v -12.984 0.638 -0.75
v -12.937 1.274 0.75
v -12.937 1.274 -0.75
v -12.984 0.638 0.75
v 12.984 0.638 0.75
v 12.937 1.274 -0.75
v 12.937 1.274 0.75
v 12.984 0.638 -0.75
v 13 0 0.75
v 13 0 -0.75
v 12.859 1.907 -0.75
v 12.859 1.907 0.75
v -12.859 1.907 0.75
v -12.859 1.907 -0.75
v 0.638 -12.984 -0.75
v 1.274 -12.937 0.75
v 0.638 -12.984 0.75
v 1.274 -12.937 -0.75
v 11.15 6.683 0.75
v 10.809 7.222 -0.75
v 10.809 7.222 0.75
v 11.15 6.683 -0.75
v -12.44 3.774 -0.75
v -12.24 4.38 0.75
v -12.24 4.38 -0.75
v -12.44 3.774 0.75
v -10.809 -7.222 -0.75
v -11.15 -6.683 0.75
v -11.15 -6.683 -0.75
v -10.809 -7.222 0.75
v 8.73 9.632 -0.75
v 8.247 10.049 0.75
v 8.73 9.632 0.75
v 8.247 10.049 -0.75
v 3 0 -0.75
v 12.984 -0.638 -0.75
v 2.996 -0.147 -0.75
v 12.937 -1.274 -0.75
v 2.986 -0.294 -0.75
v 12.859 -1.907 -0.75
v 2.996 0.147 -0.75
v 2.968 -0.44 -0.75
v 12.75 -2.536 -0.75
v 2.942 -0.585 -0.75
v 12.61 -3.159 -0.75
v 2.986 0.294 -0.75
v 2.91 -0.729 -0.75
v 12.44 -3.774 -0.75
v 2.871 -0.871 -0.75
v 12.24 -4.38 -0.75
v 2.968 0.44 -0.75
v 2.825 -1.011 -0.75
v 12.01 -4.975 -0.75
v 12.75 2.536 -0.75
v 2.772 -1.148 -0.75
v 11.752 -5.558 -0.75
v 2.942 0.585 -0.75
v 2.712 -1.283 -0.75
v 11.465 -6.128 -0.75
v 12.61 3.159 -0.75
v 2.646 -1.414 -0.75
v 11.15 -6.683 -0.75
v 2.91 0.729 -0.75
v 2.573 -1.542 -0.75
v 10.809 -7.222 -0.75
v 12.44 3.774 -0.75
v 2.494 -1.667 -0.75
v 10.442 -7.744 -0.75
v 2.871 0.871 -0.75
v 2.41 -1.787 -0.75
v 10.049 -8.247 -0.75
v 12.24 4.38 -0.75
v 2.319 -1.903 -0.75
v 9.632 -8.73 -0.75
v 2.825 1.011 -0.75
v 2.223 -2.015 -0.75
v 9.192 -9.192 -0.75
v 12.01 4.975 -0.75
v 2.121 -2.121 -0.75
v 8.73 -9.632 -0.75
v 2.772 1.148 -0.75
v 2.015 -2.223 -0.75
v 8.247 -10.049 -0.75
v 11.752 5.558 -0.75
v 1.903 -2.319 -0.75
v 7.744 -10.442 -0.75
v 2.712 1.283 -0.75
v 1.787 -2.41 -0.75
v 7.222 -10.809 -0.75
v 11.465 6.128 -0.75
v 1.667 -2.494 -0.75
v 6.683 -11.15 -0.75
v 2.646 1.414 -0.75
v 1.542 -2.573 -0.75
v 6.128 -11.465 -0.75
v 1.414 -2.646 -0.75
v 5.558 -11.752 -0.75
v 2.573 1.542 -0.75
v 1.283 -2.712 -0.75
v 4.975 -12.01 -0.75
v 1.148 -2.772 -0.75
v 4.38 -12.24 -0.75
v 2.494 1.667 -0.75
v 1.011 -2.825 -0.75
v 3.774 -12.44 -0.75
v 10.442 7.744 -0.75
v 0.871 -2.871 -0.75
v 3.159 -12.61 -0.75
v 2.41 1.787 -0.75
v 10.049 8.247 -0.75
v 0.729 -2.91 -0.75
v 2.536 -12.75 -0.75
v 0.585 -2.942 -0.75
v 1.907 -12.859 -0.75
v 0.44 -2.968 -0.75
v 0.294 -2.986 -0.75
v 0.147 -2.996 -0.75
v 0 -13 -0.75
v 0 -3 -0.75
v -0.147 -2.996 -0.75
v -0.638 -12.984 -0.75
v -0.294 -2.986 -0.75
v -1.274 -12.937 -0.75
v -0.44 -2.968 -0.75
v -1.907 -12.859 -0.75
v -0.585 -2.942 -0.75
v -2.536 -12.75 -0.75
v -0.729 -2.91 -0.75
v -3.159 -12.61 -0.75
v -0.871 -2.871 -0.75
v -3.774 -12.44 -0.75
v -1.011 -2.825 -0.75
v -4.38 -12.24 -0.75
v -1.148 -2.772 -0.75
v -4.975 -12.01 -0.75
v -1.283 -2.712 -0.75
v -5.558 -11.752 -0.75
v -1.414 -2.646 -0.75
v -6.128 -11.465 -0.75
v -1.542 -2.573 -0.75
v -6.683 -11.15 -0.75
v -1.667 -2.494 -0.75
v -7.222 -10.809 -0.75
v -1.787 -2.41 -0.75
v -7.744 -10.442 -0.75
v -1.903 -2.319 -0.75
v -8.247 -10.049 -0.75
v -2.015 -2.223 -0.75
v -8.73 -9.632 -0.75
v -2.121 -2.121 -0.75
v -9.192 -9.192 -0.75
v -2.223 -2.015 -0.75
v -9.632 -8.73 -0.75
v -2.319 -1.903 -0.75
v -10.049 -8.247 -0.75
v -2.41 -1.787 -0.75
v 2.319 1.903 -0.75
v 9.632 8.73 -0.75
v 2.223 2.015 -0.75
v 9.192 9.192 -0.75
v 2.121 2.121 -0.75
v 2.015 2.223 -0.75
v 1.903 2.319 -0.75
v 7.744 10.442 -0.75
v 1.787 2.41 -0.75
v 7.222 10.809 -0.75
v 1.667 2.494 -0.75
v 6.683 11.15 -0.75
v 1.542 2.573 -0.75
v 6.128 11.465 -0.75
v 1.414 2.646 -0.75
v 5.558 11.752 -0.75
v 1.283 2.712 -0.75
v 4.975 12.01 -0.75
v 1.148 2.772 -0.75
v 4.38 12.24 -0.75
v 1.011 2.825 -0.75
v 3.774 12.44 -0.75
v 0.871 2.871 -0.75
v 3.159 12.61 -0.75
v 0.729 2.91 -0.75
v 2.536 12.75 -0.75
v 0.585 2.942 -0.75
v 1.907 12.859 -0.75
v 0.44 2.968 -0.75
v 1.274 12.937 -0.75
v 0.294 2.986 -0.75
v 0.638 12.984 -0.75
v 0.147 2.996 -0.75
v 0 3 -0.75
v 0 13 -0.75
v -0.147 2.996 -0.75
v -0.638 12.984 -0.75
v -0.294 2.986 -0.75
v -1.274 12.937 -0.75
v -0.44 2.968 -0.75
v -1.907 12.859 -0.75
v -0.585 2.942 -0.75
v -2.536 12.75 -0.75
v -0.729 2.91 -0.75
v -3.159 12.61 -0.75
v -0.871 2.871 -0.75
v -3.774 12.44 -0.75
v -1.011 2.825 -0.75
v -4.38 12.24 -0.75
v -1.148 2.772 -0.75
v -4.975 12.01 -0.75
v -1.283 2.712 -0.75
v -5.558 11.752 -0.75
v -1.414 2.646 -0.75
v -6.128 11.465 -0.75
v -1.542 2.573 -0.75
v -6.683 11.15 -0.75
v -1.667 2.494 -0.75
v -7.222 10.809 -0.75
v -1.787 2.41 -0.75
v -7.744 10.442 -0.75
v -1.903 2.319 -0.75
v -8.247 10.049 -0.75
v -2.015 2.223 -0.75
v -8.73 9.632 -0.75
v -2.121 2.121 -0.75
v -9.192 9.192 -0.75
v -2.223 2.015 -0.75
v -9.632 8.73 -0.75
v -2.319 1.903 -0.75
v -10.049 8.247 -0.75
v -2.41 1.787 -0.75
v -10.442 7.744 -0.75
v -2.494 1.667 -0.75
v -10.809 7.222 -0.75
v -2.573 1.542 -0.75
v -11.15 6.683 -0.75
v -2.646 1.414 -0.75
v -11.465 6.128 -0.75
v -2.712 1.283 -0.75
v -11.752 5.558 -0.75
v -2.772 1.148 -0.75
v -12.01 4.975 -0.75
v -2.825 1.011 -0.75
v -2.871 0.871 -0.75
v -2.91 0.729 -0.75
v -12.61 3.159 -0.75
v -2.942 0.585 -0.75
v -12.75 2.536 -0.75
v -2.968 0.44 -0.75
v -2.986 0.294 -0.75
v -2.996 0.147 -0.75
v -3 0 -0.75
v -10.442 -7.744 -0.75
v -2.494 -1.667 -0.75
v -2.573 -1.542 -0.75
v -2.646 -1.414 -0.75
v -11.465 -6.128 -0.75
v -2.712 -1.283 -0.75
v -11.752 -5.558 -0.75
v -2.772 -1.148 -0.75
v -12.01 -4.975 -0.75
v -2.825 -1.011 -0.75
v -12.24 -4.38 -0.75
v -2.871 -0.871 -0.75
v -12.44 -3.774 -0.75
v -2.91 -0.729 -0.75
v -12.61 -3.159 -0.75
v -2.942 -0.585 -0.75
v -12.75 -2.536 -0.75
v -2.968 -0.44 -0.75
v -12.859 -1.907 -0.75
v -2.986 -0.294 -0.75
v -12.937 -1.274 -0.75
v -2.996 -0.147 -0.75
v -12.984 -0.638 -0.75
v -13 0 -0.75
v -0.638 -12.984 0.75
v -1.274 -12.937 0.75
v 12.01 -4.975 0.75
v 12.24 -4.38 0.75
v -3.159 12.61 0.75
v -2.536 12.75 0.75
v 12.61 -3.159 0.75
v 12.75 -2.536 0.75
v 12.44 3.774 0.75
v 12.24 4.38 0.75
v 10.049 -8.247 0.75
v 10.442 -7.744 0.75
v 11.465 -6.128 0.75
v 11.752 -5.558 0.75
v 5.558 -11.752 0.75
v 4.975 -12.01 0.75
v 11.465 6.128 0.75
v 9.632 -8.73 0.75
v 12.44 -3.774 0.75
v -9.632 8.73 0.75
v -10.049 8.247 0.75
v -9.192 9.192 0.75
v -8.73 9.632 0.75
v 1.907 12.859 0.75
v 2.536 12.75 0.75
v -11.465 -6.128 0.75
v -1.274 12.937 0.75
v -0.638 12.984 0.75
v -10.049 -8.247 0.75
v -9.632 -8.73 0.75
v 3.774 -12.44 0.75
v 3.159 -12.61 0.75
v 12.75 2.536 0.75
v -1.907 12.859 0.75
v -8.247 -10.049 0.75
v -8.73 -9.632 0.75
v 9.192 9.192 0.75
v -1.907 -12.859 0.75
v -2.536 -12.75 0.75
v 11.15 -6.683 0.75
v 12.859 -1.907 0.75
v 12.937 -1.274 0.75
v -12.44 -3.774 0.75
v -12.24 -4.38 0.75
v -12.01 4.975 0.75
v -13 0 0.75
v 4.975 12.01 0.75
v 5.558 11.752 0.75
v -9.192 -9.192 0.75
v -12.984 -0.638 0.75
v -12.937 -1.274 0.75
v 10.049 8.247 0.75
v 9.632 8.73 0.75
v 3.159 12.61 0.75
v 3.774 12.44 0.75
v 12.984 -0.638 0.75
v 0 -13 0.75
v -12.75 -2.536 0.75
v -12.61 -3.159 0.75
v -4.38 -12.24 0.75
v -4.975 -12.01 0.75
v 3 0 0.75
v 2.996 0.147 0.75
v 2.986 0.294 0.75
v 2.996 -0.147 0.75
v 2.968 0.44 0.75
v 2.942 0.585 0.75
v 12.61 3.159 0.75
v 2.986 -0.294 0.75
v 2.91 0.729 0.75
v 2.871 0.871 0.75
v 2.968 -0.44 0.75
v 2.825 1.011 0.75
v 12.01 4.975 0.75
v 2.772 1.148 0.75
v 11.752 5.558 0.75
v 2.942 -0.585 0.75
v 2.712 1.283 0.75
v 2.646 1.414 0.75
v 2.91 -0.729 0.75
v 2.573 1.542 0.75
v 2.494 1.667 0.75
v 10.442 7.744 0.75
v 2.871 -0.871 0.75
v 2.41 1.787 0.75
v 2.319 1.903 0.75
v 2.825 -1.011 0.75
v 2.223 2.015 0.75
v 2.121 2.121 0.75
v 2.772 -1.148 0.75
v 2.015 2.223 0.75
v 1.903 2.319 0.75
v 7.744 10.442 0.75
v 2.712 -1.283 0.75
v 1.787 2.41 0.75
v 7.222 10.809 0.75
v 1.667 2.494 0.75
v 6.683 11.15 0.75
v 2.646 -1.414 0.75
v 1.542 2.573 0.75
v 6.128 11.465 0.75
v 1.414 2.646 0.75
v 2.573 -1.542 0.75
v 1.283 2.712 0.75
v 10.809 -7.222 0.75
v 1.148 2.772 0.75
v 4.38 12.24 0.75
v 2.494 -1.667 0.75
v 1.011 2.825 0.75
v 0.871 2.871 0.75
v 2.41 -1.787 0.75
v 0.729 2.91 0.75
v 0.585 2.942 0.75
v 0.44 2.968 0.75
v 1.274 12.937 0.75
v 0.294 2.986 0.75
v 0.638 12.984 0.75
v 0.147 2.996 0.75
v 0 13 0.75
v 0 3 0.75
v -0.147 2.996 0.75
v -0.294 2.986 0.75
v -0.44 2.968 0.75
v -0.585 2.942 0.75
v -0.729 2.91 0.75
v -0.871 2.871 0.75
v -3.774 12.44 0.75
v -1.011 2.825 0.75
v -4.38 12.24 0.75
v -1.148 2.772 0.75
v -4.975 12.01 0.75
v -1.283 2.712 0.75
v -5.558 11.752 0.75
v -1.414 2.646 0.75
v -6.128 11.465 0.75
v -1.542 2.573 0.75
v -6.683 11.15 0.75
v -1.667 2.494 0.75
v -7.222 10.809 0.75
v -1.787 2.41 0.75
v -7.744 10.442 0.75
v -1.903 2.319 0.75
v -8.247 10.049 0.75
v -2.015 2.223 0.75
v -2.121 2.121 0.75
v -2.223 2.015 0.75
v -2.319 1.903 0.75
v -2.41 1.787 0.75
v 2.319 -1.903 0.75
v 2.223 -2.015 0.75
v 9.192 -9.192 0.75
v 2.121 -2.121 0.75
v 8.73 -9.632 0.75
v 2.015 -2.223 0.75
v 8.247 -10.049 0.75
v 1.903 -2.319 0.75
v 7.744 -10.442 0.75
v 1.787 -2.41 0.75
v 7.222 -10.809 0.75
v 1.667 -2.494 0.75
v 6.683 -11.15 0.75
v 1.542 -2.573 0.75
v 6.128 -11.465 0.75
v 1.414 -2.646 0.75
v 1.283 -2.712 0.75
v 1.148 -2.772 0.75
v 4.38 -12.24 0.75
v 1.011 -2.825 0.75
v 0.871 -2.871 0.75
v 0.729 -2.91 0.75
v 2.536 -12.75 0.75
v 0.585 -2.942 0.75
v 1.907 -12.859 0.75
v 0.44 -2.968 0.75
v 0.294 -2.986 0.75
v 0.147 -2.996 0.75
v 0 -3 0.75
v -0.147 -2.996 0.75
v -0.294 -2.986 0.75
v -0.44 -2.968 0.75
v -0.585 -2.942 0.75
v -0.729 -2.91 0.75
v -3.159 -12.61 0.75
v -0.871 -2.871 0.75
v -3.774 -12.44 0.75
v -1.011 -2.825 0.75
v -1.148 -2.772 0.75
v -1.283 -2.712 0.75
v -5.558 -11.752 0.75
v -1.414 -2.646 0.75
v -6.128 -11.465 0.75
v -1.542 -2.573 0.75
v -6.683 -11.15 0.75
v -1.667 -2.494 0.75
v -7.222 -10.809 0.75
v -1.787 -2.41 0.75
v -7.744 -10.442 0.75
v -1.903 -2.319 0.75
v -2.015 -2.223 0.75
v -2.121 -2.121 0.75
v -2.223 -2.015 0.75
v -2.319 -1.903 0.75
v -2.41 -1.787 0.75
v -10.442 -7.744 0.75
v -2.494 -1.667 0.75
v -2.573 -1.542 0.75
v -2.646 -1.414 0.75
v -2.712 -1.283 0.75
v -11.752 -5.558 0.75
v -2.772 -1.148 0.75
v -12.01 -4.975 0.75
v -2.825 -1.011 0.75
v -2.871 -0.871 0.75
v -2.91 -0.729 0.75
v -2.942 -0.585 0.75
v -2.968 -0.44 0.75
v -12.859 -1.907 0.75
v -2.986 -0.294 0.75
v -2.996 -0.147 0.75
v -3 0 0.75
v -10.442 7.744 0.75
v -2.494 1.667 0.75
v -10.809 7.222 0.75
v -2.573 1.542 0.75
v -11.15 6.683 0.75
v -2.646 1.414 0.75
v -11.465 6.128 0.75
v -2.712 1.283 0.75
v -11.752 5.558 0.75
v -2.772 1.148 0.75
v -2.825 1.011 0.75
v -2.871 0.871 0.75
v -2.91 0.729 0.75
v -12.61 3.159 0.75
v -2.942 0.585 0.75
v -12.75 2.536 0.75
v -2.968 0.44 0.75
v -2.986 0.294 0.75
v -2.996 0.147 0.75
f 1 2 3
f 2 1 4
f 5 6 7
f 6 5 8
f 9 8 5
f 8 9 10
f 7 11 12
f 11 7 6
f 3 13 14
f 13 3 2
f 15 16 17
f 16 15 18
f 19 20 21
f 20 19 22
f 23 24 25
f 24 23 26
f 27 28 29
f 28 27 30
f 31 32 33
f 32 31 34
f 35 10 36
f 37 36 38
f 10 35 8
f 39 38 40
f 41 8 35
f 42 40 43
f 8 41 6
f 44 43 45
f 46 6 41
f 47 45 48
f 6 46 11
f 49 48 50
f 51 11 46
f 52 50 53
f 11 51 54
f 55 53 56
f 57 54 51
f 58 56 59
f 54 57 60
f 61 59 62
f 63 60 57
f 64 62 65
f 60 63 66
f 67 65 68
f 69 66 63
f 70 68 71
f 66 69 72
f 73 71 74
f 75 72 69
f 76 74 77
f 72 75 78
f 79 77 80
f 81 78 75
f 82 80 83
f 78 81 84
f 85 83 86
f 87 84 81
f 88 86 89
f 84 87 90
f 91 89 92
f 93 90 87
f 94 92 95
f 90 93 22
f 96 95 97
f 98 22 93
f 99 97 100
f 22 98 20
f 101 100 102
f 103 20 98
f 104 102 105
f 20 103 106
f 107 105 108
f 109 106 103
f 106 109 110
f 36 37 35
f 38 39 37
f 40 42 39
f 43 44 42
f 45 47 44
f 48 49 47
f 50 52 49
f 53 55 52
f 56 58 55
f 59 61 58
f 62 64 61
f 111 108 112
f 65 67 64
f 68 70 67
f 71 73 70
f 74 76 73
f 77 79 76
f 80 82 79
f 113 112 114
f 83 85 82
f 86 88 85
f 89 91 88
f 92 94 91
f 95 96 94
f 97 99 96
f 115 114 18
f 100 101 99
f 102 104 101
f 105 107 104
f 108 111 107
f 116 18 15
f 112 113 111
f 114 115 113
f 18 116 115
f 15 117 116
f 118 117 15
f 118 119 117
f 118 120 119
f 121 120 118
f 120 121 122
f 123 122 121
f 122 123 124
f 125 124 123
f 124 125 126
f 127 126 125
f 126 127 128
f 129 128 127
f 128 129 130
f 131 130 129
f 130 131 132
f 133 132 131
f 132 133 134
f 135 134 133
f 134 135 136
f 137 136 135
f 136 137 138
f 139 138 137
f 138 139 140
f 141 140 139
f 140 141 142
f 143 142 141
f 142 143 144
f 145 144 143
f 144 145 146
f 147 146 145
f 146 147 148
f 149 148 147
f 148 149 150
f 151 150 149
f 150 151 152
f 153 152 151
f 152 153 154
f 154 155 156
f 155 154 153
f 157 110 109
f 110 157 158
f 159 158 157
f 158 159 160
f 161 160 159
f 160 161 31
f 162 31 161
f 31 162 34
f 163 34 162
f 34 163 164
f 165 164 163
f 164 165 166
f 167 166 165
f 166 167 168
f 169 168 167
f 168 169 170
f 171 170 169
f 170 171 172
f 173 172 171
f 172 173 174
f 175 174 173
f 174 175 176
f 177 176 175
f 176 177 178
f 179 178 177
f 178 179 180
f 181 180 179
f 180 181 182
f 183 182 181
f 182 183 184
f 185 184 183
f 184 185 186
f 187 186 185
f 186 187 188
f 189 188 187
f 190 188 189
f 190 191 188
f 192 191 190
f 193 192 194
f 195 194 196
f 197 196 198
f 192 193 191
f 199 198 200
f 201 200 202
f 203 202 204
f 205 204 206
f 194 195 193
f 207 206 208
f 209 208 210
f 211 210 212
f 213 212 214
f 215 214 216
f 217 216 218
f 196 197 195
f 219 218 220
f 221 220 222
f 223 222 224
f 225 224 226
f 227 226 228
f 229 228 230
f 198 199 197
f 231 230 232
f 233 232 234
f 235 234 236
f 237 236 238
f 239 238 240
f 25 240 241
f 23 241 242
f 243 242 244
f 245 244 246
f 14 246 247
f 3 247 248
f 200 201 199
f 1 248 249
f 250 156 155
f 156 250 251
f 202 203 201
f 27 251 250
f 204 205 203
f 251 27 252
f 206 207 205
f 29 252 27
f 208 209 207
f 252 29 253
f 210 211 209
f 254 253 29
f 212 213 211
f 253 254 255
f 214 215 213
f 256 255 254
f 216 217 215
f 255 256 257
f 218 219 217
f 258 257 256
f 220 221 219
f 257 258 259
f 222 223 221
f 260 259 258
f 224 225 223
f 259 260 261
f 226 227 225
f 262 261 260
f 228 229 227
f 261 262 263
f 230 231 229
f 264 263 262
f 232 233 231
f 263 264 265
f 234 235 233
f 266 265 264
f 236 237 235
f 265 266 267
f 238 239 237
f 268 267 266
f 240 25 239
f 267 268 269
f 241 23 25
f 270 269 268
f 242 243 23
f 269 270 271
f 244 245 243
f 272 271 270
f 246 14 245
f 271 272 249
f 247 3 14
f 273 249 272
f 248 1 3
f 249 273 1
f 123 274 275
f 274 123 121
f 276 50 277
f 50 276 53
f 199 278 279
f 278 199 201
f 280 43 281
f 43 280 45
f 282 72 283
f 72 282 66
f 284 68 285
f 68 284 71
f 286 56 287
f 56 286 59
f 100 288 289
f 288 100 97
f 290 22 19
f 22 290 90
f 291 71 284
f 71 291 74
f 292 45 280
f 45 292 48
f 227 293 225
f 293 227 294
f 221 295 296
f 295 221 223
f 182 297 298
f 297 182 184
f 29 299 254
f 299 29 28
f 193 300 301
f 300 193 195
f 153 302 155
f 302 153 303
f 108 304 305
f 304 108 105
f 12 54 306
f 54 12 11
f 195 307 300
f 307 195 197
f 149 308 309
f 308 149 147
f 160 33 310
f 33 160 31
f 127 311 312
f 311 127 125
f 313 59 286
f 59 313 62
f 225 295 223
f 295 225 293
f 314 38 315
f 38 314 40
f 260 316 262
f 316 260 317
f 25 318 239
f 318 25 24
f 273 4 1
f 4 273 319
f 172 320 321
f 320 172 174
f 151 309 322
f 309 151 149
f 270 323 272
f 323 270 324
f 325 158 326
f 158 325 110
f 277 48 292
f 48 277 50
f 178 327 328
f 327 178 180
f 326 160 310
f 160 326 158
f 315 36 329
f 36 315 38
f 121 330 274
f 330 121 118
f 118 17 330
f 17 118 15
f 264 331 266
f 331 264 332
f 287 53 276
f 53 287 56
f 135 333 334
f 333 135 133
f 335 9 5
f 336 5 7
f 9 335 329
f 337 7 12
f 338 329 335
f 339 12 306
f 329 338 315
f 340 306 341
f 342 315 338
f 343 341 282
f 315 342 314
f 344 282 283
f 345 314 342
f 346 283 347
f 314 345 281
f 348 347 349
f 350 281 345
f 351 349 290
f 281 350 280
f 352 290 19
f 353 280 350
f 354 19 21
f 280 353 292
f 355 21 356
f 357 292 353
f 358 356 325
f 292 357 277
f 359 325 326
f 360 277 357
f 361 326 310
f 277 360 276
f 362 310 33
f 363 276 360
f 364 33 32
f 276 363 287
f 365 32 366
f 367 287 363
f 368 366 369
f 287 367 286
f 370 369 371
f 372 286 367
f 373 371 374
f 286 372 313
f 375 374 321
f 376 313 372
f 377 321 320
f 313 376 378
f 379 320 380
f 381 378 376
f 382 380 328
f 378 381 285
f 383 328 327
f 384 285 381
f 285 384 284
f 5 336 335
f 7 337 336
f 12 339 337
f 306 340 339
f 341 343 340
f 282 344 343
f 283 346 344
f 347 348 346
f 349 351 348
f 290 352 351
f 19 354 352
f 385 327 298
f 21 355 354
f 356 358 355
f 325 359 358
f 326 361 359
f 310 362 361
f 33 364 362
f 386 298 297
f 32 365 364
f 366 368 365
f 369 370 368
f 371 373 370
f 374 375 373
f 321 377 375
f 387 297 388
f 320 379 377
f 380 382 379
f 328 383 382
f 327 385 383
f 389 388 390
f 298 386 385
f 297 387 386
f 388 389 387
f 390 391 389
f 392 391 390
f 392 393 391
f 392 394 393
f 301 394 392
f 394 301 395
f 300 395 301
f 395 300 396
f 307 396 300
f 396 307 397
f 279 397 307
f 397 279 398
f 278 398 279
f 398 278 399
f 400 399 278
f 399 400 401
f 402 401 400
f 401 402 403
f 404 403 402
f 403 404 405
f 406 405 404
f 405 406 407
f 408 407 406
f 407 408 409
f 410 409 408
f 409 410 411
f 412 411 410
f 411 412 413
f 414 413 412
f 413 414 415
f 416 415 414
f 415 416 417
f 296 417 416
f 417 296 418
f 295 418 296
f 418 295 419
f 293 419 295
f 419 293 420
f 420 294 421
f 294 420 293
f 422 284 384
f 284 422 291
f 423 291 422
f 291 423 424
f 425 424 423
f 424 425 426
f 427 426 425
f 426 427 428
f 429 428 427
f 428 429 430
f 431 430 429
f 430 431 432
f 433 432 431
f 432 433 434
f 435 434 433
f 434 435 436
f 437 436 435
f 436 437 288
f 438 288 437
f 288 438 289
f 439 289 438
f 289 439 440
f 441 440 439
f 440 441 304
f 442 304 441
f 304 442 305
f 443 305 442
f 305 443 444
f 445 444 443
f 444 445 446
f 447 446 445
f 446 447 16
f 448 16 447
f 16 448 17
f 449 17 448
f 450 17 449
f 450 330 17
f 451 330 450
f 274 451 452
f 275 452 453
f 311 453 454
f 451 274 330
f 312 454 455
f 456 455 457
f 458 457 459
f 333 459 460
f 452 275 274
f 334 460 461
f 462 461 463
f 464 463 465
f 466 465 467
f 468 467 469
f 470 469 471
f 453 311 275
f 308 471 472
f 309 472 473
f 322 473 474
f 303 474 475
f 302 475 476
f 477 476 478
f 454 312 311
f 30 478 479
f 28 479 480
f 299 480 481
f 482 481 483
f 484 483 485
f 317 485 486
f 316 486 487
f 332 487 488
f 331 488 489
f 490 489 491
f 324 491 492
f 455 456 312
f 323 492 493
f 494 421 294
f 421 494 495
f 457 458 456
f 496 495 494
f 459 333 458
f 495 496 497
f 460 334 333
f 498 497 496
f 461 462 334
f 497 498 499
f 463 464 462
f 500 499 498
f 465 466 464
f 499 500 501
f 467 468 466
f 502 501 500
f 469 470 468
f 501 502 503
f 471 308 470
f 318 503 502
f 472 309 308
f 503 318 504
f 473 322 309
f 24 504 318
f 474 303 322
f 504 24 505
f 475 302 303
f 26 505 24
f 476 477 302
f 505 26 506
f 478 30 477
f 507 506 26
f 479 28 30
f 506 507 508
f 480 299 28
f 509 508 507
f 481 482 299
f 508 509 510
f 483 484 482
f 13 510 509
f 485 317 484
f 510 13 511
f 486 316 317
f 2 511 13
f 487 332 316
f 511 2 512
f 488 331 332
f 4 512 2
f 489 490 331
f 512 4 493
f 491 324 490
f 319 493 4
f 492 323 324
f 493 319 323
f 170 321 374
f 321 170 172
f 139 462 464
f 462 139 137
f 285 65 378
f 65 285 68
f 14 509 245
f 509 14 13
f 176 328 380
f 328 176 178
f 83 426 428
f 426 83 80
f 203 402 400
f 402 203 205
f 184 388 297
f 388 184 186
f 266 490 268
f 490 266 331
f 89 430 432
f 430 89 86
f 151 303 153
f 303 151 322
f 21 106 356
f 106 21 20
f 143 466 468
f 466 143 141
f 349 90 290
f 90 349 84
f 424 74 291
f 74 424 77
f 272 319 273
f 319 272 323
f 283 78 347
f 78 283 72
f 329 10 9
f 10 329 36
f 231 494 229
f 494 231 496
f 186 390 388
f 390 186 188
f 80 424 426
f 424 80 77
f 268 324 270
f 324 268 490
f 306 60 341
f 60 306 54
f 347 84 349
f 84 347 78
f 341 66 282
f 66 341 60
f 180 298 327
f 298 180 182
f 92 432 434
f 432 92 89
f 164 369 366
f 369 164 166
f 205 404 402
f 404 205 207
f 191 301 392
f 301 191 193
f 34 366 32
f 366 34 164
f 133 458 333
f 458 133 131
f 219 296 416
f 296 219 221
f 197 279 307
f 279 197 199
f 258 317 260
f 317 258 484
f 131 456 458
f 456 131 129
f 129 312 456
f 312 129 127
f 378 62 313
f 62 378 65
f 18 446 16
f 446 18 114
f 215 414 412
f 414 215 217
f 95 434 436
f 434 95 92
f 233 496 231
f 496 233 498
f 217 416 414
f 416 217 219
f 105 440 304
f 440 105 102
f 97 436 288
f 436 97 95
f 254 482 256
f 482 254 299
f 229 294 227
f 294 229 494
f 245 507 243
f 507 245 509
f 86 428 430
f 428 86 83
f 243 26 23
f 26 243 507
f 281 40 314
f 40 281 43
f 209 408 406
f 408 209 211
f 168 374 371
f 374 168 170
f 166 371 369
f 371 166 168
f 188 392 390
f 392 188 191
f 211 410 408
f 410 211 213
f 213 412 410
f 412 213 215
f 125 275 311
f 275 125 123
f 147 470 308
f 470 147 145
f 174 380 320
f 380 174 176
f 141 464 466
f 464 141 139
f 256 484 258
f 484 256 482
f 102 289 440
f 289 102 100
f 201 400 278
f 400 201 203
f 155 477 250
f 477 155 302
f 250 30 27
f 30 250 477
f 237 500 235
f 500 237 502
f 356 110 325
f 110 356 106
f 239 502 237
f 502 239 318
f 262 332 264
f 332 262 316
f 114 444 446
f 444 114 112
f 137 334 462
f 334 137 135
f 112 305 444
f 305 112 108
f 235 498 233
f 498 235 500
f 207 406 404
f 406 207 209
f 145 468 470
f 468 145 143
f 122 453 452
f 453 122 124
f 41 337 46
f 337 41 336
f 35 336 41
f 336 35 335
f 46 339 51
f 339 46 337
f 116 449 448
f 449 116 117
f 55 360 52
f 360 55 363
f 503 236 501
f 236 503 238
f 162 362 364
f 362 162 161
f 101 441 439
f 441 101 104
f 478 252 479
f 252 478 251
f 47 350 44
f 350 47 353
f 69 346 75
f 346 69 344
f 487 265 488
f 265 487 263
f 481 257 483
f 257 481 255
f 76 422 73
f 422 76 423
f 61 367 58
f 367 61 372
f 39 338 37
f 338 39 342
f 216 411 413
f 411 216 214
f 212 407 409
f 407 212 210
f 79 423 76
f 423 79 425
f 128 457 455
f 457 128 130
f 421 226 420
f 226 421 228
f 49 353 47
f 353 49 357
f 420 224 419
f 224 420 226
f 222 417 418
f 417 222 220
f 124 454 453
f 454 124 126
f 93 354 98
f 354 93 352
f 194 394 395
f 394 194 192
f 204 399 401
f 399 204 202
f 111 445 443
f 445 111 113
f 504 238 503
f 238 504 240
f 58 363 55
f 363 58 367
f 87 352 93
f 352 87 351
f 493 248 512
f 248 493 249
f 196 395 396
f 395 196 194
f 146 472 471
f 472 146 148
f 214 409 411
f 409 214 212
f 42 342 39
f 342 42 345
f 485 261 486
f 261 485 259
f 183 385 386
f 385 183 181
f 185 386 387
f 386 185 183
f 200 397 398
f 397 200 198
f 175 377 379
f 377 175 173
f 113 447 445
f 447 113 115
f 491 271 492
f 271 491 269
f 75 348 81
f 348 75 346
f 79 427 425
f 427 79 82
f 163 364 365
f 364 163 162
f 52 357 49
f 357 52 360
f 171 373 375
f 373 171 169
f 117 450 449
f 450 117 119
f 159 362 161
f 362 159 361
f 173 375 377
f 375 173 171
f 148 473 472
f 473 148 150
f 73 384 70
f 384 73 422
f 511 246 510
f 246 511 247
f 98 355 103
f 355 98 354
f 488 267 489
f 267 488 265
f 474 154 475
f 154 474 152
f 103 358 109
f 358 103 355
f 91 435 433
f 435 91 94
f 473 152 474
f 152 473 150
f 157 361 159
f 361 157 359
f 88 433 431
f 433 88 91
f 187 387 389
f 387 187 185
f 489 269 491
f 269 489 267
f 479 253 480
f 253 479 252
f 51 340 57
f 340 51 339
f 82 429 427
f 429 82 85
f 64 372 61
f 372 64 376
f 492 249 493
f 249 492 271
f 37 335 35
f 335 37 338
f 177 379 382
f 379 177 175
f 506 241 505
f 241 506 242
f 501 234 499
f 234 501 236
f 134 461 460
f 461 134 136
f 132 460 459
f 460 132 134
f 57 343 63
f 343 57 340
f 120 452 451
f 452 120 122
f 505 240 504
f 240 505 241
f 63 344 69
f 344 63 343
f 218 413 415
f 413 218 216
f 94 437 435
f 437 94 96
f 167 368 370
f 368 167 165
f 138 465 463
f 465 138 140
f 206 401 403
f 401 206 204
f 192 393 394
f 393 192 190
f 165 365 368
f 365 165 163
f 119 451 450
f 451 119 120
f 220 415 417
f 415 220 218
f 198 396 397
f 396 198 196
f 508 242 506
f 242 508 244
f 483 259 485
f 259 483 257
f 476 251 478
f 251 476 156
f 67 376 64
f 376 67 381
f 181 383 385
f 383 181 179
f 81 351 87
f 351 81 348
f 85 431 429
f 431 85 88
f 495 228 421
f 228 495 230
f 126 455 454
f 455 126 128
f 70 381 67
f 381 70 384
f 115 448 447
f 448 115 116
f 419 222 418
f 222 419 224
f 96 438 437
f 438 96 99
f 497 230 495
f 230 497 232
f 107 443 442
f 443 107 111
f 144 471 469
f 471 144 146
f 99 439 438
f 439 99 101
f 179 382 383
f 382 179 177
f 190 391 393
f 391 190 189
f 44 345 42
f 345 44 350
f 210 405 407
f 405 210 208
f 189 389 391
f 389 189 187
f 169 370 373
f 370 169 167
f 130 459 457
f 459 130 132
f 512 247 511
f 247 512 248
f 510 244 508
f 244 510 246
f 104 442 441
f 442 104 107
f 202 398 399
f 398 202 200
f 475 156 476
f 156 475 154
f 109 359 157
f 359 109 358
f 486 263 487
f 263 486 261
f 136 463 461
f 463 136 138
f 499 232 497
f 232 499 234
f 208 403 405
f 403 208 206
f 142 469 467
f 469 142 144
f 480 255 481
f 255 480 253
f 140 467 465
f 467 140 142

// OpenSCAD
// Penny washer parameters (mm)
inner_diameter_mm = 6.0;   //[3:12:0.1]
outer_diameter_mm = 26.0;  //[13:52:0.1]
thickness_mm      = 1.5;   //[0.75:3:0.05]
eps_mm            = 0.2;   //[0.05:0.5:0.05]

$fn = 128;

module penny_washer(inner_d, outer_d, t, eps=0.2) {
    difference() {
        cylinder(d=outer_d, h=t, center=true);
        cylinder(d=inner_d, h=t + 2*eps, center=true);
    }
}

// Single connected solid: one washer only
penny_washer(inner_diameter_mm, outer_diameter_mm, thickness_mm, eps_mm);
